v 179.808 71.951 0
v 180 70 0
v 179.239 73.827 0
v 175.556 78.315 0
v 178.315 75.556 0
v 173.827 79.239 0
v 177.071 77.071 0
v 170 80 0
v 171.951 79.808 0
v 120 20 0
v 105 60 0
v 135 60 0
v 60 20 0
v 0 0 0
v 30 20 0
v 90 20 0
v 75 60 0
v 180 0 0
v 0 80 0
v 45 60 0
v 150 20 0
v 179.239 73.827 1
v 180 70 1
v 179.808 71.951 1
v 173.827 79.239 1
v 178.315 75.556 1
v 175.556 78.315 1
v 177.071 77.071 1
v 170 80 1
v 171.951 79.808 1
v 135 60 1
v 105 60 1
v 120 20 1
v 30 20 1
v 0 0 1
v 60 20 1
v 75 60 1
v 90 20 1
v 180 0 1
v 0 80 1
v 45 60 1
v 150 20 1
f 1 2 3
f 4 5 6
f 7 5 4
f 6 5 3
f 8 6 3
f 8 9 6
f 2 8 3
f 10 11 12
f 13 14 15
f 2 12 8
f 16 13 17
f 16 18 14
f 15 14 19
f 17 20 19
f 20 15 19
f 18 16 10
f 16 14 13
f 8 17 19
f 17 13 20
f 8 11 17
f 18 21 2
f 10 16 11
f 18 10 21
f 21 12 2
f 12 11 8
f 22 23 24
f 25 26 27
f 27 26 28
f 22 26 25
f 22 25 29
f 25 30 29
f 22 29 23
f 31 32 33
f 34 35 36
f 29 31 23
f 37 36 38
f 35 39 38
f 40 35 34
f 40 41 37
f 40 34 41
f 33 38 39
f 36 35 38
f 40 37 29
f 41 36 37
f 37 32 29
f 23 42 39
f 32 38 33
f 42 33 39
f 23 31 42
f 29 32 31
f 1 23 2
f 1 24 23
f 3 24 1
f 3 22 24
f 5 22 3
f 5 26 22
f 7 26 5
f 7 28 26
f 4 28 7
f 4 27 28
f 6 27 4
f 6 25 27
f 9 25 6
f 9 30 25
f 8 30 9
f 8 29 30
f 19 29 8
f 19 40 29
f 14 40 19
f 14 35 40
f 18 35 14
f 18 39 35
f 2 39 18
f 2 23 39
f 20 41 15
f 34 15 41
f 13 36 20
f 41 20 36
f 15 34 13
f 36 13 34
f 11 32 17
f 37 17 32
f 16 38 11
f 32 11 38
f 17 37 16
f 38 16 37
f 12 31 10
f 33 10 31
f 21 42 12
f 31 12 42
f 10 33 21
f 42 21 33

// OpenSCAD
// Generated by Parametrix
ca_myPartI_face2_000 = [ [ 0.0000, -0.0000 ],[ 180.0000, 0.0000 ],[ 180.0000, 70.0000 ],[ 179.8079, 71.9509 ],[ 179.2388, 73.8268 ],[ 178.3147, 75.5557 ],[ 177.0711, 77.0711 ],[ 175.5557, 78.3147 ],[ 173.8268, 79.2388 ],[ 171.9509, 79.8079 ],[ 170.0000, 80.0000 ],[ 0.0000, 80.0000 ],[ 0.0000, -0.0000 ] ];
cb_myPartI_face2_000 = [  0, 1, 2, 3, 4, 5, 6, 7, 8, 9, 10, 11, 12 ];
ca_myPartI_face2_001 = [ [ 30.0000, 20.0000 ],[ 60.0000, 20.0000 ],[ 45.0000, 60.0000 ],[ 30.0000, 20.0000 ] ];
cb_myPartI_face2_001 = [  13, 14, 15, 16 ];
ca_myPartI_face2_002 = [ [ 105.0000, 60.0000 ],[ 75.0000, 60.0000 ],[ 90.0000, 20.0000 ],[ 105.0000, 60.0000 ] ];
cb_myPartI_face2_002 = [  17, 18, 19, 20 ];
ca_myPartI_face2_003 = [ [ 120.0000, 20.0000 ],[ 150.0000, 20.0000 ],[ 135.0000, 60.0000 ],[ 120.0000, 20.0000 ] ];
cb_myPartI_face2_003 = [  21, 22, 23, 24 ];
a_myPartI_face2 = concat(ca_myPartI_face2_000, ca_myPartI_face2_001, ca_myPartI_face2_002, ca_myPartI_face2_003);
b_myPartI_face2 = [cb_myPartI_face2_000, cb_myPartI_face2_001, cb_myPartI_face2_002, cb_myPartI_face2_003];

module subpax_myPartI_2 () {
	translate( [ 0, 0, 0 ])
		rotate( [ 0, 0, 0 ])
			   linear_extrude(height = 1) polygon(a_myPartI_face2, b_myPartI_face2);
}

module pax_myPartI () {
	subpax_myPartI_2();
}

pax_myPartI();
